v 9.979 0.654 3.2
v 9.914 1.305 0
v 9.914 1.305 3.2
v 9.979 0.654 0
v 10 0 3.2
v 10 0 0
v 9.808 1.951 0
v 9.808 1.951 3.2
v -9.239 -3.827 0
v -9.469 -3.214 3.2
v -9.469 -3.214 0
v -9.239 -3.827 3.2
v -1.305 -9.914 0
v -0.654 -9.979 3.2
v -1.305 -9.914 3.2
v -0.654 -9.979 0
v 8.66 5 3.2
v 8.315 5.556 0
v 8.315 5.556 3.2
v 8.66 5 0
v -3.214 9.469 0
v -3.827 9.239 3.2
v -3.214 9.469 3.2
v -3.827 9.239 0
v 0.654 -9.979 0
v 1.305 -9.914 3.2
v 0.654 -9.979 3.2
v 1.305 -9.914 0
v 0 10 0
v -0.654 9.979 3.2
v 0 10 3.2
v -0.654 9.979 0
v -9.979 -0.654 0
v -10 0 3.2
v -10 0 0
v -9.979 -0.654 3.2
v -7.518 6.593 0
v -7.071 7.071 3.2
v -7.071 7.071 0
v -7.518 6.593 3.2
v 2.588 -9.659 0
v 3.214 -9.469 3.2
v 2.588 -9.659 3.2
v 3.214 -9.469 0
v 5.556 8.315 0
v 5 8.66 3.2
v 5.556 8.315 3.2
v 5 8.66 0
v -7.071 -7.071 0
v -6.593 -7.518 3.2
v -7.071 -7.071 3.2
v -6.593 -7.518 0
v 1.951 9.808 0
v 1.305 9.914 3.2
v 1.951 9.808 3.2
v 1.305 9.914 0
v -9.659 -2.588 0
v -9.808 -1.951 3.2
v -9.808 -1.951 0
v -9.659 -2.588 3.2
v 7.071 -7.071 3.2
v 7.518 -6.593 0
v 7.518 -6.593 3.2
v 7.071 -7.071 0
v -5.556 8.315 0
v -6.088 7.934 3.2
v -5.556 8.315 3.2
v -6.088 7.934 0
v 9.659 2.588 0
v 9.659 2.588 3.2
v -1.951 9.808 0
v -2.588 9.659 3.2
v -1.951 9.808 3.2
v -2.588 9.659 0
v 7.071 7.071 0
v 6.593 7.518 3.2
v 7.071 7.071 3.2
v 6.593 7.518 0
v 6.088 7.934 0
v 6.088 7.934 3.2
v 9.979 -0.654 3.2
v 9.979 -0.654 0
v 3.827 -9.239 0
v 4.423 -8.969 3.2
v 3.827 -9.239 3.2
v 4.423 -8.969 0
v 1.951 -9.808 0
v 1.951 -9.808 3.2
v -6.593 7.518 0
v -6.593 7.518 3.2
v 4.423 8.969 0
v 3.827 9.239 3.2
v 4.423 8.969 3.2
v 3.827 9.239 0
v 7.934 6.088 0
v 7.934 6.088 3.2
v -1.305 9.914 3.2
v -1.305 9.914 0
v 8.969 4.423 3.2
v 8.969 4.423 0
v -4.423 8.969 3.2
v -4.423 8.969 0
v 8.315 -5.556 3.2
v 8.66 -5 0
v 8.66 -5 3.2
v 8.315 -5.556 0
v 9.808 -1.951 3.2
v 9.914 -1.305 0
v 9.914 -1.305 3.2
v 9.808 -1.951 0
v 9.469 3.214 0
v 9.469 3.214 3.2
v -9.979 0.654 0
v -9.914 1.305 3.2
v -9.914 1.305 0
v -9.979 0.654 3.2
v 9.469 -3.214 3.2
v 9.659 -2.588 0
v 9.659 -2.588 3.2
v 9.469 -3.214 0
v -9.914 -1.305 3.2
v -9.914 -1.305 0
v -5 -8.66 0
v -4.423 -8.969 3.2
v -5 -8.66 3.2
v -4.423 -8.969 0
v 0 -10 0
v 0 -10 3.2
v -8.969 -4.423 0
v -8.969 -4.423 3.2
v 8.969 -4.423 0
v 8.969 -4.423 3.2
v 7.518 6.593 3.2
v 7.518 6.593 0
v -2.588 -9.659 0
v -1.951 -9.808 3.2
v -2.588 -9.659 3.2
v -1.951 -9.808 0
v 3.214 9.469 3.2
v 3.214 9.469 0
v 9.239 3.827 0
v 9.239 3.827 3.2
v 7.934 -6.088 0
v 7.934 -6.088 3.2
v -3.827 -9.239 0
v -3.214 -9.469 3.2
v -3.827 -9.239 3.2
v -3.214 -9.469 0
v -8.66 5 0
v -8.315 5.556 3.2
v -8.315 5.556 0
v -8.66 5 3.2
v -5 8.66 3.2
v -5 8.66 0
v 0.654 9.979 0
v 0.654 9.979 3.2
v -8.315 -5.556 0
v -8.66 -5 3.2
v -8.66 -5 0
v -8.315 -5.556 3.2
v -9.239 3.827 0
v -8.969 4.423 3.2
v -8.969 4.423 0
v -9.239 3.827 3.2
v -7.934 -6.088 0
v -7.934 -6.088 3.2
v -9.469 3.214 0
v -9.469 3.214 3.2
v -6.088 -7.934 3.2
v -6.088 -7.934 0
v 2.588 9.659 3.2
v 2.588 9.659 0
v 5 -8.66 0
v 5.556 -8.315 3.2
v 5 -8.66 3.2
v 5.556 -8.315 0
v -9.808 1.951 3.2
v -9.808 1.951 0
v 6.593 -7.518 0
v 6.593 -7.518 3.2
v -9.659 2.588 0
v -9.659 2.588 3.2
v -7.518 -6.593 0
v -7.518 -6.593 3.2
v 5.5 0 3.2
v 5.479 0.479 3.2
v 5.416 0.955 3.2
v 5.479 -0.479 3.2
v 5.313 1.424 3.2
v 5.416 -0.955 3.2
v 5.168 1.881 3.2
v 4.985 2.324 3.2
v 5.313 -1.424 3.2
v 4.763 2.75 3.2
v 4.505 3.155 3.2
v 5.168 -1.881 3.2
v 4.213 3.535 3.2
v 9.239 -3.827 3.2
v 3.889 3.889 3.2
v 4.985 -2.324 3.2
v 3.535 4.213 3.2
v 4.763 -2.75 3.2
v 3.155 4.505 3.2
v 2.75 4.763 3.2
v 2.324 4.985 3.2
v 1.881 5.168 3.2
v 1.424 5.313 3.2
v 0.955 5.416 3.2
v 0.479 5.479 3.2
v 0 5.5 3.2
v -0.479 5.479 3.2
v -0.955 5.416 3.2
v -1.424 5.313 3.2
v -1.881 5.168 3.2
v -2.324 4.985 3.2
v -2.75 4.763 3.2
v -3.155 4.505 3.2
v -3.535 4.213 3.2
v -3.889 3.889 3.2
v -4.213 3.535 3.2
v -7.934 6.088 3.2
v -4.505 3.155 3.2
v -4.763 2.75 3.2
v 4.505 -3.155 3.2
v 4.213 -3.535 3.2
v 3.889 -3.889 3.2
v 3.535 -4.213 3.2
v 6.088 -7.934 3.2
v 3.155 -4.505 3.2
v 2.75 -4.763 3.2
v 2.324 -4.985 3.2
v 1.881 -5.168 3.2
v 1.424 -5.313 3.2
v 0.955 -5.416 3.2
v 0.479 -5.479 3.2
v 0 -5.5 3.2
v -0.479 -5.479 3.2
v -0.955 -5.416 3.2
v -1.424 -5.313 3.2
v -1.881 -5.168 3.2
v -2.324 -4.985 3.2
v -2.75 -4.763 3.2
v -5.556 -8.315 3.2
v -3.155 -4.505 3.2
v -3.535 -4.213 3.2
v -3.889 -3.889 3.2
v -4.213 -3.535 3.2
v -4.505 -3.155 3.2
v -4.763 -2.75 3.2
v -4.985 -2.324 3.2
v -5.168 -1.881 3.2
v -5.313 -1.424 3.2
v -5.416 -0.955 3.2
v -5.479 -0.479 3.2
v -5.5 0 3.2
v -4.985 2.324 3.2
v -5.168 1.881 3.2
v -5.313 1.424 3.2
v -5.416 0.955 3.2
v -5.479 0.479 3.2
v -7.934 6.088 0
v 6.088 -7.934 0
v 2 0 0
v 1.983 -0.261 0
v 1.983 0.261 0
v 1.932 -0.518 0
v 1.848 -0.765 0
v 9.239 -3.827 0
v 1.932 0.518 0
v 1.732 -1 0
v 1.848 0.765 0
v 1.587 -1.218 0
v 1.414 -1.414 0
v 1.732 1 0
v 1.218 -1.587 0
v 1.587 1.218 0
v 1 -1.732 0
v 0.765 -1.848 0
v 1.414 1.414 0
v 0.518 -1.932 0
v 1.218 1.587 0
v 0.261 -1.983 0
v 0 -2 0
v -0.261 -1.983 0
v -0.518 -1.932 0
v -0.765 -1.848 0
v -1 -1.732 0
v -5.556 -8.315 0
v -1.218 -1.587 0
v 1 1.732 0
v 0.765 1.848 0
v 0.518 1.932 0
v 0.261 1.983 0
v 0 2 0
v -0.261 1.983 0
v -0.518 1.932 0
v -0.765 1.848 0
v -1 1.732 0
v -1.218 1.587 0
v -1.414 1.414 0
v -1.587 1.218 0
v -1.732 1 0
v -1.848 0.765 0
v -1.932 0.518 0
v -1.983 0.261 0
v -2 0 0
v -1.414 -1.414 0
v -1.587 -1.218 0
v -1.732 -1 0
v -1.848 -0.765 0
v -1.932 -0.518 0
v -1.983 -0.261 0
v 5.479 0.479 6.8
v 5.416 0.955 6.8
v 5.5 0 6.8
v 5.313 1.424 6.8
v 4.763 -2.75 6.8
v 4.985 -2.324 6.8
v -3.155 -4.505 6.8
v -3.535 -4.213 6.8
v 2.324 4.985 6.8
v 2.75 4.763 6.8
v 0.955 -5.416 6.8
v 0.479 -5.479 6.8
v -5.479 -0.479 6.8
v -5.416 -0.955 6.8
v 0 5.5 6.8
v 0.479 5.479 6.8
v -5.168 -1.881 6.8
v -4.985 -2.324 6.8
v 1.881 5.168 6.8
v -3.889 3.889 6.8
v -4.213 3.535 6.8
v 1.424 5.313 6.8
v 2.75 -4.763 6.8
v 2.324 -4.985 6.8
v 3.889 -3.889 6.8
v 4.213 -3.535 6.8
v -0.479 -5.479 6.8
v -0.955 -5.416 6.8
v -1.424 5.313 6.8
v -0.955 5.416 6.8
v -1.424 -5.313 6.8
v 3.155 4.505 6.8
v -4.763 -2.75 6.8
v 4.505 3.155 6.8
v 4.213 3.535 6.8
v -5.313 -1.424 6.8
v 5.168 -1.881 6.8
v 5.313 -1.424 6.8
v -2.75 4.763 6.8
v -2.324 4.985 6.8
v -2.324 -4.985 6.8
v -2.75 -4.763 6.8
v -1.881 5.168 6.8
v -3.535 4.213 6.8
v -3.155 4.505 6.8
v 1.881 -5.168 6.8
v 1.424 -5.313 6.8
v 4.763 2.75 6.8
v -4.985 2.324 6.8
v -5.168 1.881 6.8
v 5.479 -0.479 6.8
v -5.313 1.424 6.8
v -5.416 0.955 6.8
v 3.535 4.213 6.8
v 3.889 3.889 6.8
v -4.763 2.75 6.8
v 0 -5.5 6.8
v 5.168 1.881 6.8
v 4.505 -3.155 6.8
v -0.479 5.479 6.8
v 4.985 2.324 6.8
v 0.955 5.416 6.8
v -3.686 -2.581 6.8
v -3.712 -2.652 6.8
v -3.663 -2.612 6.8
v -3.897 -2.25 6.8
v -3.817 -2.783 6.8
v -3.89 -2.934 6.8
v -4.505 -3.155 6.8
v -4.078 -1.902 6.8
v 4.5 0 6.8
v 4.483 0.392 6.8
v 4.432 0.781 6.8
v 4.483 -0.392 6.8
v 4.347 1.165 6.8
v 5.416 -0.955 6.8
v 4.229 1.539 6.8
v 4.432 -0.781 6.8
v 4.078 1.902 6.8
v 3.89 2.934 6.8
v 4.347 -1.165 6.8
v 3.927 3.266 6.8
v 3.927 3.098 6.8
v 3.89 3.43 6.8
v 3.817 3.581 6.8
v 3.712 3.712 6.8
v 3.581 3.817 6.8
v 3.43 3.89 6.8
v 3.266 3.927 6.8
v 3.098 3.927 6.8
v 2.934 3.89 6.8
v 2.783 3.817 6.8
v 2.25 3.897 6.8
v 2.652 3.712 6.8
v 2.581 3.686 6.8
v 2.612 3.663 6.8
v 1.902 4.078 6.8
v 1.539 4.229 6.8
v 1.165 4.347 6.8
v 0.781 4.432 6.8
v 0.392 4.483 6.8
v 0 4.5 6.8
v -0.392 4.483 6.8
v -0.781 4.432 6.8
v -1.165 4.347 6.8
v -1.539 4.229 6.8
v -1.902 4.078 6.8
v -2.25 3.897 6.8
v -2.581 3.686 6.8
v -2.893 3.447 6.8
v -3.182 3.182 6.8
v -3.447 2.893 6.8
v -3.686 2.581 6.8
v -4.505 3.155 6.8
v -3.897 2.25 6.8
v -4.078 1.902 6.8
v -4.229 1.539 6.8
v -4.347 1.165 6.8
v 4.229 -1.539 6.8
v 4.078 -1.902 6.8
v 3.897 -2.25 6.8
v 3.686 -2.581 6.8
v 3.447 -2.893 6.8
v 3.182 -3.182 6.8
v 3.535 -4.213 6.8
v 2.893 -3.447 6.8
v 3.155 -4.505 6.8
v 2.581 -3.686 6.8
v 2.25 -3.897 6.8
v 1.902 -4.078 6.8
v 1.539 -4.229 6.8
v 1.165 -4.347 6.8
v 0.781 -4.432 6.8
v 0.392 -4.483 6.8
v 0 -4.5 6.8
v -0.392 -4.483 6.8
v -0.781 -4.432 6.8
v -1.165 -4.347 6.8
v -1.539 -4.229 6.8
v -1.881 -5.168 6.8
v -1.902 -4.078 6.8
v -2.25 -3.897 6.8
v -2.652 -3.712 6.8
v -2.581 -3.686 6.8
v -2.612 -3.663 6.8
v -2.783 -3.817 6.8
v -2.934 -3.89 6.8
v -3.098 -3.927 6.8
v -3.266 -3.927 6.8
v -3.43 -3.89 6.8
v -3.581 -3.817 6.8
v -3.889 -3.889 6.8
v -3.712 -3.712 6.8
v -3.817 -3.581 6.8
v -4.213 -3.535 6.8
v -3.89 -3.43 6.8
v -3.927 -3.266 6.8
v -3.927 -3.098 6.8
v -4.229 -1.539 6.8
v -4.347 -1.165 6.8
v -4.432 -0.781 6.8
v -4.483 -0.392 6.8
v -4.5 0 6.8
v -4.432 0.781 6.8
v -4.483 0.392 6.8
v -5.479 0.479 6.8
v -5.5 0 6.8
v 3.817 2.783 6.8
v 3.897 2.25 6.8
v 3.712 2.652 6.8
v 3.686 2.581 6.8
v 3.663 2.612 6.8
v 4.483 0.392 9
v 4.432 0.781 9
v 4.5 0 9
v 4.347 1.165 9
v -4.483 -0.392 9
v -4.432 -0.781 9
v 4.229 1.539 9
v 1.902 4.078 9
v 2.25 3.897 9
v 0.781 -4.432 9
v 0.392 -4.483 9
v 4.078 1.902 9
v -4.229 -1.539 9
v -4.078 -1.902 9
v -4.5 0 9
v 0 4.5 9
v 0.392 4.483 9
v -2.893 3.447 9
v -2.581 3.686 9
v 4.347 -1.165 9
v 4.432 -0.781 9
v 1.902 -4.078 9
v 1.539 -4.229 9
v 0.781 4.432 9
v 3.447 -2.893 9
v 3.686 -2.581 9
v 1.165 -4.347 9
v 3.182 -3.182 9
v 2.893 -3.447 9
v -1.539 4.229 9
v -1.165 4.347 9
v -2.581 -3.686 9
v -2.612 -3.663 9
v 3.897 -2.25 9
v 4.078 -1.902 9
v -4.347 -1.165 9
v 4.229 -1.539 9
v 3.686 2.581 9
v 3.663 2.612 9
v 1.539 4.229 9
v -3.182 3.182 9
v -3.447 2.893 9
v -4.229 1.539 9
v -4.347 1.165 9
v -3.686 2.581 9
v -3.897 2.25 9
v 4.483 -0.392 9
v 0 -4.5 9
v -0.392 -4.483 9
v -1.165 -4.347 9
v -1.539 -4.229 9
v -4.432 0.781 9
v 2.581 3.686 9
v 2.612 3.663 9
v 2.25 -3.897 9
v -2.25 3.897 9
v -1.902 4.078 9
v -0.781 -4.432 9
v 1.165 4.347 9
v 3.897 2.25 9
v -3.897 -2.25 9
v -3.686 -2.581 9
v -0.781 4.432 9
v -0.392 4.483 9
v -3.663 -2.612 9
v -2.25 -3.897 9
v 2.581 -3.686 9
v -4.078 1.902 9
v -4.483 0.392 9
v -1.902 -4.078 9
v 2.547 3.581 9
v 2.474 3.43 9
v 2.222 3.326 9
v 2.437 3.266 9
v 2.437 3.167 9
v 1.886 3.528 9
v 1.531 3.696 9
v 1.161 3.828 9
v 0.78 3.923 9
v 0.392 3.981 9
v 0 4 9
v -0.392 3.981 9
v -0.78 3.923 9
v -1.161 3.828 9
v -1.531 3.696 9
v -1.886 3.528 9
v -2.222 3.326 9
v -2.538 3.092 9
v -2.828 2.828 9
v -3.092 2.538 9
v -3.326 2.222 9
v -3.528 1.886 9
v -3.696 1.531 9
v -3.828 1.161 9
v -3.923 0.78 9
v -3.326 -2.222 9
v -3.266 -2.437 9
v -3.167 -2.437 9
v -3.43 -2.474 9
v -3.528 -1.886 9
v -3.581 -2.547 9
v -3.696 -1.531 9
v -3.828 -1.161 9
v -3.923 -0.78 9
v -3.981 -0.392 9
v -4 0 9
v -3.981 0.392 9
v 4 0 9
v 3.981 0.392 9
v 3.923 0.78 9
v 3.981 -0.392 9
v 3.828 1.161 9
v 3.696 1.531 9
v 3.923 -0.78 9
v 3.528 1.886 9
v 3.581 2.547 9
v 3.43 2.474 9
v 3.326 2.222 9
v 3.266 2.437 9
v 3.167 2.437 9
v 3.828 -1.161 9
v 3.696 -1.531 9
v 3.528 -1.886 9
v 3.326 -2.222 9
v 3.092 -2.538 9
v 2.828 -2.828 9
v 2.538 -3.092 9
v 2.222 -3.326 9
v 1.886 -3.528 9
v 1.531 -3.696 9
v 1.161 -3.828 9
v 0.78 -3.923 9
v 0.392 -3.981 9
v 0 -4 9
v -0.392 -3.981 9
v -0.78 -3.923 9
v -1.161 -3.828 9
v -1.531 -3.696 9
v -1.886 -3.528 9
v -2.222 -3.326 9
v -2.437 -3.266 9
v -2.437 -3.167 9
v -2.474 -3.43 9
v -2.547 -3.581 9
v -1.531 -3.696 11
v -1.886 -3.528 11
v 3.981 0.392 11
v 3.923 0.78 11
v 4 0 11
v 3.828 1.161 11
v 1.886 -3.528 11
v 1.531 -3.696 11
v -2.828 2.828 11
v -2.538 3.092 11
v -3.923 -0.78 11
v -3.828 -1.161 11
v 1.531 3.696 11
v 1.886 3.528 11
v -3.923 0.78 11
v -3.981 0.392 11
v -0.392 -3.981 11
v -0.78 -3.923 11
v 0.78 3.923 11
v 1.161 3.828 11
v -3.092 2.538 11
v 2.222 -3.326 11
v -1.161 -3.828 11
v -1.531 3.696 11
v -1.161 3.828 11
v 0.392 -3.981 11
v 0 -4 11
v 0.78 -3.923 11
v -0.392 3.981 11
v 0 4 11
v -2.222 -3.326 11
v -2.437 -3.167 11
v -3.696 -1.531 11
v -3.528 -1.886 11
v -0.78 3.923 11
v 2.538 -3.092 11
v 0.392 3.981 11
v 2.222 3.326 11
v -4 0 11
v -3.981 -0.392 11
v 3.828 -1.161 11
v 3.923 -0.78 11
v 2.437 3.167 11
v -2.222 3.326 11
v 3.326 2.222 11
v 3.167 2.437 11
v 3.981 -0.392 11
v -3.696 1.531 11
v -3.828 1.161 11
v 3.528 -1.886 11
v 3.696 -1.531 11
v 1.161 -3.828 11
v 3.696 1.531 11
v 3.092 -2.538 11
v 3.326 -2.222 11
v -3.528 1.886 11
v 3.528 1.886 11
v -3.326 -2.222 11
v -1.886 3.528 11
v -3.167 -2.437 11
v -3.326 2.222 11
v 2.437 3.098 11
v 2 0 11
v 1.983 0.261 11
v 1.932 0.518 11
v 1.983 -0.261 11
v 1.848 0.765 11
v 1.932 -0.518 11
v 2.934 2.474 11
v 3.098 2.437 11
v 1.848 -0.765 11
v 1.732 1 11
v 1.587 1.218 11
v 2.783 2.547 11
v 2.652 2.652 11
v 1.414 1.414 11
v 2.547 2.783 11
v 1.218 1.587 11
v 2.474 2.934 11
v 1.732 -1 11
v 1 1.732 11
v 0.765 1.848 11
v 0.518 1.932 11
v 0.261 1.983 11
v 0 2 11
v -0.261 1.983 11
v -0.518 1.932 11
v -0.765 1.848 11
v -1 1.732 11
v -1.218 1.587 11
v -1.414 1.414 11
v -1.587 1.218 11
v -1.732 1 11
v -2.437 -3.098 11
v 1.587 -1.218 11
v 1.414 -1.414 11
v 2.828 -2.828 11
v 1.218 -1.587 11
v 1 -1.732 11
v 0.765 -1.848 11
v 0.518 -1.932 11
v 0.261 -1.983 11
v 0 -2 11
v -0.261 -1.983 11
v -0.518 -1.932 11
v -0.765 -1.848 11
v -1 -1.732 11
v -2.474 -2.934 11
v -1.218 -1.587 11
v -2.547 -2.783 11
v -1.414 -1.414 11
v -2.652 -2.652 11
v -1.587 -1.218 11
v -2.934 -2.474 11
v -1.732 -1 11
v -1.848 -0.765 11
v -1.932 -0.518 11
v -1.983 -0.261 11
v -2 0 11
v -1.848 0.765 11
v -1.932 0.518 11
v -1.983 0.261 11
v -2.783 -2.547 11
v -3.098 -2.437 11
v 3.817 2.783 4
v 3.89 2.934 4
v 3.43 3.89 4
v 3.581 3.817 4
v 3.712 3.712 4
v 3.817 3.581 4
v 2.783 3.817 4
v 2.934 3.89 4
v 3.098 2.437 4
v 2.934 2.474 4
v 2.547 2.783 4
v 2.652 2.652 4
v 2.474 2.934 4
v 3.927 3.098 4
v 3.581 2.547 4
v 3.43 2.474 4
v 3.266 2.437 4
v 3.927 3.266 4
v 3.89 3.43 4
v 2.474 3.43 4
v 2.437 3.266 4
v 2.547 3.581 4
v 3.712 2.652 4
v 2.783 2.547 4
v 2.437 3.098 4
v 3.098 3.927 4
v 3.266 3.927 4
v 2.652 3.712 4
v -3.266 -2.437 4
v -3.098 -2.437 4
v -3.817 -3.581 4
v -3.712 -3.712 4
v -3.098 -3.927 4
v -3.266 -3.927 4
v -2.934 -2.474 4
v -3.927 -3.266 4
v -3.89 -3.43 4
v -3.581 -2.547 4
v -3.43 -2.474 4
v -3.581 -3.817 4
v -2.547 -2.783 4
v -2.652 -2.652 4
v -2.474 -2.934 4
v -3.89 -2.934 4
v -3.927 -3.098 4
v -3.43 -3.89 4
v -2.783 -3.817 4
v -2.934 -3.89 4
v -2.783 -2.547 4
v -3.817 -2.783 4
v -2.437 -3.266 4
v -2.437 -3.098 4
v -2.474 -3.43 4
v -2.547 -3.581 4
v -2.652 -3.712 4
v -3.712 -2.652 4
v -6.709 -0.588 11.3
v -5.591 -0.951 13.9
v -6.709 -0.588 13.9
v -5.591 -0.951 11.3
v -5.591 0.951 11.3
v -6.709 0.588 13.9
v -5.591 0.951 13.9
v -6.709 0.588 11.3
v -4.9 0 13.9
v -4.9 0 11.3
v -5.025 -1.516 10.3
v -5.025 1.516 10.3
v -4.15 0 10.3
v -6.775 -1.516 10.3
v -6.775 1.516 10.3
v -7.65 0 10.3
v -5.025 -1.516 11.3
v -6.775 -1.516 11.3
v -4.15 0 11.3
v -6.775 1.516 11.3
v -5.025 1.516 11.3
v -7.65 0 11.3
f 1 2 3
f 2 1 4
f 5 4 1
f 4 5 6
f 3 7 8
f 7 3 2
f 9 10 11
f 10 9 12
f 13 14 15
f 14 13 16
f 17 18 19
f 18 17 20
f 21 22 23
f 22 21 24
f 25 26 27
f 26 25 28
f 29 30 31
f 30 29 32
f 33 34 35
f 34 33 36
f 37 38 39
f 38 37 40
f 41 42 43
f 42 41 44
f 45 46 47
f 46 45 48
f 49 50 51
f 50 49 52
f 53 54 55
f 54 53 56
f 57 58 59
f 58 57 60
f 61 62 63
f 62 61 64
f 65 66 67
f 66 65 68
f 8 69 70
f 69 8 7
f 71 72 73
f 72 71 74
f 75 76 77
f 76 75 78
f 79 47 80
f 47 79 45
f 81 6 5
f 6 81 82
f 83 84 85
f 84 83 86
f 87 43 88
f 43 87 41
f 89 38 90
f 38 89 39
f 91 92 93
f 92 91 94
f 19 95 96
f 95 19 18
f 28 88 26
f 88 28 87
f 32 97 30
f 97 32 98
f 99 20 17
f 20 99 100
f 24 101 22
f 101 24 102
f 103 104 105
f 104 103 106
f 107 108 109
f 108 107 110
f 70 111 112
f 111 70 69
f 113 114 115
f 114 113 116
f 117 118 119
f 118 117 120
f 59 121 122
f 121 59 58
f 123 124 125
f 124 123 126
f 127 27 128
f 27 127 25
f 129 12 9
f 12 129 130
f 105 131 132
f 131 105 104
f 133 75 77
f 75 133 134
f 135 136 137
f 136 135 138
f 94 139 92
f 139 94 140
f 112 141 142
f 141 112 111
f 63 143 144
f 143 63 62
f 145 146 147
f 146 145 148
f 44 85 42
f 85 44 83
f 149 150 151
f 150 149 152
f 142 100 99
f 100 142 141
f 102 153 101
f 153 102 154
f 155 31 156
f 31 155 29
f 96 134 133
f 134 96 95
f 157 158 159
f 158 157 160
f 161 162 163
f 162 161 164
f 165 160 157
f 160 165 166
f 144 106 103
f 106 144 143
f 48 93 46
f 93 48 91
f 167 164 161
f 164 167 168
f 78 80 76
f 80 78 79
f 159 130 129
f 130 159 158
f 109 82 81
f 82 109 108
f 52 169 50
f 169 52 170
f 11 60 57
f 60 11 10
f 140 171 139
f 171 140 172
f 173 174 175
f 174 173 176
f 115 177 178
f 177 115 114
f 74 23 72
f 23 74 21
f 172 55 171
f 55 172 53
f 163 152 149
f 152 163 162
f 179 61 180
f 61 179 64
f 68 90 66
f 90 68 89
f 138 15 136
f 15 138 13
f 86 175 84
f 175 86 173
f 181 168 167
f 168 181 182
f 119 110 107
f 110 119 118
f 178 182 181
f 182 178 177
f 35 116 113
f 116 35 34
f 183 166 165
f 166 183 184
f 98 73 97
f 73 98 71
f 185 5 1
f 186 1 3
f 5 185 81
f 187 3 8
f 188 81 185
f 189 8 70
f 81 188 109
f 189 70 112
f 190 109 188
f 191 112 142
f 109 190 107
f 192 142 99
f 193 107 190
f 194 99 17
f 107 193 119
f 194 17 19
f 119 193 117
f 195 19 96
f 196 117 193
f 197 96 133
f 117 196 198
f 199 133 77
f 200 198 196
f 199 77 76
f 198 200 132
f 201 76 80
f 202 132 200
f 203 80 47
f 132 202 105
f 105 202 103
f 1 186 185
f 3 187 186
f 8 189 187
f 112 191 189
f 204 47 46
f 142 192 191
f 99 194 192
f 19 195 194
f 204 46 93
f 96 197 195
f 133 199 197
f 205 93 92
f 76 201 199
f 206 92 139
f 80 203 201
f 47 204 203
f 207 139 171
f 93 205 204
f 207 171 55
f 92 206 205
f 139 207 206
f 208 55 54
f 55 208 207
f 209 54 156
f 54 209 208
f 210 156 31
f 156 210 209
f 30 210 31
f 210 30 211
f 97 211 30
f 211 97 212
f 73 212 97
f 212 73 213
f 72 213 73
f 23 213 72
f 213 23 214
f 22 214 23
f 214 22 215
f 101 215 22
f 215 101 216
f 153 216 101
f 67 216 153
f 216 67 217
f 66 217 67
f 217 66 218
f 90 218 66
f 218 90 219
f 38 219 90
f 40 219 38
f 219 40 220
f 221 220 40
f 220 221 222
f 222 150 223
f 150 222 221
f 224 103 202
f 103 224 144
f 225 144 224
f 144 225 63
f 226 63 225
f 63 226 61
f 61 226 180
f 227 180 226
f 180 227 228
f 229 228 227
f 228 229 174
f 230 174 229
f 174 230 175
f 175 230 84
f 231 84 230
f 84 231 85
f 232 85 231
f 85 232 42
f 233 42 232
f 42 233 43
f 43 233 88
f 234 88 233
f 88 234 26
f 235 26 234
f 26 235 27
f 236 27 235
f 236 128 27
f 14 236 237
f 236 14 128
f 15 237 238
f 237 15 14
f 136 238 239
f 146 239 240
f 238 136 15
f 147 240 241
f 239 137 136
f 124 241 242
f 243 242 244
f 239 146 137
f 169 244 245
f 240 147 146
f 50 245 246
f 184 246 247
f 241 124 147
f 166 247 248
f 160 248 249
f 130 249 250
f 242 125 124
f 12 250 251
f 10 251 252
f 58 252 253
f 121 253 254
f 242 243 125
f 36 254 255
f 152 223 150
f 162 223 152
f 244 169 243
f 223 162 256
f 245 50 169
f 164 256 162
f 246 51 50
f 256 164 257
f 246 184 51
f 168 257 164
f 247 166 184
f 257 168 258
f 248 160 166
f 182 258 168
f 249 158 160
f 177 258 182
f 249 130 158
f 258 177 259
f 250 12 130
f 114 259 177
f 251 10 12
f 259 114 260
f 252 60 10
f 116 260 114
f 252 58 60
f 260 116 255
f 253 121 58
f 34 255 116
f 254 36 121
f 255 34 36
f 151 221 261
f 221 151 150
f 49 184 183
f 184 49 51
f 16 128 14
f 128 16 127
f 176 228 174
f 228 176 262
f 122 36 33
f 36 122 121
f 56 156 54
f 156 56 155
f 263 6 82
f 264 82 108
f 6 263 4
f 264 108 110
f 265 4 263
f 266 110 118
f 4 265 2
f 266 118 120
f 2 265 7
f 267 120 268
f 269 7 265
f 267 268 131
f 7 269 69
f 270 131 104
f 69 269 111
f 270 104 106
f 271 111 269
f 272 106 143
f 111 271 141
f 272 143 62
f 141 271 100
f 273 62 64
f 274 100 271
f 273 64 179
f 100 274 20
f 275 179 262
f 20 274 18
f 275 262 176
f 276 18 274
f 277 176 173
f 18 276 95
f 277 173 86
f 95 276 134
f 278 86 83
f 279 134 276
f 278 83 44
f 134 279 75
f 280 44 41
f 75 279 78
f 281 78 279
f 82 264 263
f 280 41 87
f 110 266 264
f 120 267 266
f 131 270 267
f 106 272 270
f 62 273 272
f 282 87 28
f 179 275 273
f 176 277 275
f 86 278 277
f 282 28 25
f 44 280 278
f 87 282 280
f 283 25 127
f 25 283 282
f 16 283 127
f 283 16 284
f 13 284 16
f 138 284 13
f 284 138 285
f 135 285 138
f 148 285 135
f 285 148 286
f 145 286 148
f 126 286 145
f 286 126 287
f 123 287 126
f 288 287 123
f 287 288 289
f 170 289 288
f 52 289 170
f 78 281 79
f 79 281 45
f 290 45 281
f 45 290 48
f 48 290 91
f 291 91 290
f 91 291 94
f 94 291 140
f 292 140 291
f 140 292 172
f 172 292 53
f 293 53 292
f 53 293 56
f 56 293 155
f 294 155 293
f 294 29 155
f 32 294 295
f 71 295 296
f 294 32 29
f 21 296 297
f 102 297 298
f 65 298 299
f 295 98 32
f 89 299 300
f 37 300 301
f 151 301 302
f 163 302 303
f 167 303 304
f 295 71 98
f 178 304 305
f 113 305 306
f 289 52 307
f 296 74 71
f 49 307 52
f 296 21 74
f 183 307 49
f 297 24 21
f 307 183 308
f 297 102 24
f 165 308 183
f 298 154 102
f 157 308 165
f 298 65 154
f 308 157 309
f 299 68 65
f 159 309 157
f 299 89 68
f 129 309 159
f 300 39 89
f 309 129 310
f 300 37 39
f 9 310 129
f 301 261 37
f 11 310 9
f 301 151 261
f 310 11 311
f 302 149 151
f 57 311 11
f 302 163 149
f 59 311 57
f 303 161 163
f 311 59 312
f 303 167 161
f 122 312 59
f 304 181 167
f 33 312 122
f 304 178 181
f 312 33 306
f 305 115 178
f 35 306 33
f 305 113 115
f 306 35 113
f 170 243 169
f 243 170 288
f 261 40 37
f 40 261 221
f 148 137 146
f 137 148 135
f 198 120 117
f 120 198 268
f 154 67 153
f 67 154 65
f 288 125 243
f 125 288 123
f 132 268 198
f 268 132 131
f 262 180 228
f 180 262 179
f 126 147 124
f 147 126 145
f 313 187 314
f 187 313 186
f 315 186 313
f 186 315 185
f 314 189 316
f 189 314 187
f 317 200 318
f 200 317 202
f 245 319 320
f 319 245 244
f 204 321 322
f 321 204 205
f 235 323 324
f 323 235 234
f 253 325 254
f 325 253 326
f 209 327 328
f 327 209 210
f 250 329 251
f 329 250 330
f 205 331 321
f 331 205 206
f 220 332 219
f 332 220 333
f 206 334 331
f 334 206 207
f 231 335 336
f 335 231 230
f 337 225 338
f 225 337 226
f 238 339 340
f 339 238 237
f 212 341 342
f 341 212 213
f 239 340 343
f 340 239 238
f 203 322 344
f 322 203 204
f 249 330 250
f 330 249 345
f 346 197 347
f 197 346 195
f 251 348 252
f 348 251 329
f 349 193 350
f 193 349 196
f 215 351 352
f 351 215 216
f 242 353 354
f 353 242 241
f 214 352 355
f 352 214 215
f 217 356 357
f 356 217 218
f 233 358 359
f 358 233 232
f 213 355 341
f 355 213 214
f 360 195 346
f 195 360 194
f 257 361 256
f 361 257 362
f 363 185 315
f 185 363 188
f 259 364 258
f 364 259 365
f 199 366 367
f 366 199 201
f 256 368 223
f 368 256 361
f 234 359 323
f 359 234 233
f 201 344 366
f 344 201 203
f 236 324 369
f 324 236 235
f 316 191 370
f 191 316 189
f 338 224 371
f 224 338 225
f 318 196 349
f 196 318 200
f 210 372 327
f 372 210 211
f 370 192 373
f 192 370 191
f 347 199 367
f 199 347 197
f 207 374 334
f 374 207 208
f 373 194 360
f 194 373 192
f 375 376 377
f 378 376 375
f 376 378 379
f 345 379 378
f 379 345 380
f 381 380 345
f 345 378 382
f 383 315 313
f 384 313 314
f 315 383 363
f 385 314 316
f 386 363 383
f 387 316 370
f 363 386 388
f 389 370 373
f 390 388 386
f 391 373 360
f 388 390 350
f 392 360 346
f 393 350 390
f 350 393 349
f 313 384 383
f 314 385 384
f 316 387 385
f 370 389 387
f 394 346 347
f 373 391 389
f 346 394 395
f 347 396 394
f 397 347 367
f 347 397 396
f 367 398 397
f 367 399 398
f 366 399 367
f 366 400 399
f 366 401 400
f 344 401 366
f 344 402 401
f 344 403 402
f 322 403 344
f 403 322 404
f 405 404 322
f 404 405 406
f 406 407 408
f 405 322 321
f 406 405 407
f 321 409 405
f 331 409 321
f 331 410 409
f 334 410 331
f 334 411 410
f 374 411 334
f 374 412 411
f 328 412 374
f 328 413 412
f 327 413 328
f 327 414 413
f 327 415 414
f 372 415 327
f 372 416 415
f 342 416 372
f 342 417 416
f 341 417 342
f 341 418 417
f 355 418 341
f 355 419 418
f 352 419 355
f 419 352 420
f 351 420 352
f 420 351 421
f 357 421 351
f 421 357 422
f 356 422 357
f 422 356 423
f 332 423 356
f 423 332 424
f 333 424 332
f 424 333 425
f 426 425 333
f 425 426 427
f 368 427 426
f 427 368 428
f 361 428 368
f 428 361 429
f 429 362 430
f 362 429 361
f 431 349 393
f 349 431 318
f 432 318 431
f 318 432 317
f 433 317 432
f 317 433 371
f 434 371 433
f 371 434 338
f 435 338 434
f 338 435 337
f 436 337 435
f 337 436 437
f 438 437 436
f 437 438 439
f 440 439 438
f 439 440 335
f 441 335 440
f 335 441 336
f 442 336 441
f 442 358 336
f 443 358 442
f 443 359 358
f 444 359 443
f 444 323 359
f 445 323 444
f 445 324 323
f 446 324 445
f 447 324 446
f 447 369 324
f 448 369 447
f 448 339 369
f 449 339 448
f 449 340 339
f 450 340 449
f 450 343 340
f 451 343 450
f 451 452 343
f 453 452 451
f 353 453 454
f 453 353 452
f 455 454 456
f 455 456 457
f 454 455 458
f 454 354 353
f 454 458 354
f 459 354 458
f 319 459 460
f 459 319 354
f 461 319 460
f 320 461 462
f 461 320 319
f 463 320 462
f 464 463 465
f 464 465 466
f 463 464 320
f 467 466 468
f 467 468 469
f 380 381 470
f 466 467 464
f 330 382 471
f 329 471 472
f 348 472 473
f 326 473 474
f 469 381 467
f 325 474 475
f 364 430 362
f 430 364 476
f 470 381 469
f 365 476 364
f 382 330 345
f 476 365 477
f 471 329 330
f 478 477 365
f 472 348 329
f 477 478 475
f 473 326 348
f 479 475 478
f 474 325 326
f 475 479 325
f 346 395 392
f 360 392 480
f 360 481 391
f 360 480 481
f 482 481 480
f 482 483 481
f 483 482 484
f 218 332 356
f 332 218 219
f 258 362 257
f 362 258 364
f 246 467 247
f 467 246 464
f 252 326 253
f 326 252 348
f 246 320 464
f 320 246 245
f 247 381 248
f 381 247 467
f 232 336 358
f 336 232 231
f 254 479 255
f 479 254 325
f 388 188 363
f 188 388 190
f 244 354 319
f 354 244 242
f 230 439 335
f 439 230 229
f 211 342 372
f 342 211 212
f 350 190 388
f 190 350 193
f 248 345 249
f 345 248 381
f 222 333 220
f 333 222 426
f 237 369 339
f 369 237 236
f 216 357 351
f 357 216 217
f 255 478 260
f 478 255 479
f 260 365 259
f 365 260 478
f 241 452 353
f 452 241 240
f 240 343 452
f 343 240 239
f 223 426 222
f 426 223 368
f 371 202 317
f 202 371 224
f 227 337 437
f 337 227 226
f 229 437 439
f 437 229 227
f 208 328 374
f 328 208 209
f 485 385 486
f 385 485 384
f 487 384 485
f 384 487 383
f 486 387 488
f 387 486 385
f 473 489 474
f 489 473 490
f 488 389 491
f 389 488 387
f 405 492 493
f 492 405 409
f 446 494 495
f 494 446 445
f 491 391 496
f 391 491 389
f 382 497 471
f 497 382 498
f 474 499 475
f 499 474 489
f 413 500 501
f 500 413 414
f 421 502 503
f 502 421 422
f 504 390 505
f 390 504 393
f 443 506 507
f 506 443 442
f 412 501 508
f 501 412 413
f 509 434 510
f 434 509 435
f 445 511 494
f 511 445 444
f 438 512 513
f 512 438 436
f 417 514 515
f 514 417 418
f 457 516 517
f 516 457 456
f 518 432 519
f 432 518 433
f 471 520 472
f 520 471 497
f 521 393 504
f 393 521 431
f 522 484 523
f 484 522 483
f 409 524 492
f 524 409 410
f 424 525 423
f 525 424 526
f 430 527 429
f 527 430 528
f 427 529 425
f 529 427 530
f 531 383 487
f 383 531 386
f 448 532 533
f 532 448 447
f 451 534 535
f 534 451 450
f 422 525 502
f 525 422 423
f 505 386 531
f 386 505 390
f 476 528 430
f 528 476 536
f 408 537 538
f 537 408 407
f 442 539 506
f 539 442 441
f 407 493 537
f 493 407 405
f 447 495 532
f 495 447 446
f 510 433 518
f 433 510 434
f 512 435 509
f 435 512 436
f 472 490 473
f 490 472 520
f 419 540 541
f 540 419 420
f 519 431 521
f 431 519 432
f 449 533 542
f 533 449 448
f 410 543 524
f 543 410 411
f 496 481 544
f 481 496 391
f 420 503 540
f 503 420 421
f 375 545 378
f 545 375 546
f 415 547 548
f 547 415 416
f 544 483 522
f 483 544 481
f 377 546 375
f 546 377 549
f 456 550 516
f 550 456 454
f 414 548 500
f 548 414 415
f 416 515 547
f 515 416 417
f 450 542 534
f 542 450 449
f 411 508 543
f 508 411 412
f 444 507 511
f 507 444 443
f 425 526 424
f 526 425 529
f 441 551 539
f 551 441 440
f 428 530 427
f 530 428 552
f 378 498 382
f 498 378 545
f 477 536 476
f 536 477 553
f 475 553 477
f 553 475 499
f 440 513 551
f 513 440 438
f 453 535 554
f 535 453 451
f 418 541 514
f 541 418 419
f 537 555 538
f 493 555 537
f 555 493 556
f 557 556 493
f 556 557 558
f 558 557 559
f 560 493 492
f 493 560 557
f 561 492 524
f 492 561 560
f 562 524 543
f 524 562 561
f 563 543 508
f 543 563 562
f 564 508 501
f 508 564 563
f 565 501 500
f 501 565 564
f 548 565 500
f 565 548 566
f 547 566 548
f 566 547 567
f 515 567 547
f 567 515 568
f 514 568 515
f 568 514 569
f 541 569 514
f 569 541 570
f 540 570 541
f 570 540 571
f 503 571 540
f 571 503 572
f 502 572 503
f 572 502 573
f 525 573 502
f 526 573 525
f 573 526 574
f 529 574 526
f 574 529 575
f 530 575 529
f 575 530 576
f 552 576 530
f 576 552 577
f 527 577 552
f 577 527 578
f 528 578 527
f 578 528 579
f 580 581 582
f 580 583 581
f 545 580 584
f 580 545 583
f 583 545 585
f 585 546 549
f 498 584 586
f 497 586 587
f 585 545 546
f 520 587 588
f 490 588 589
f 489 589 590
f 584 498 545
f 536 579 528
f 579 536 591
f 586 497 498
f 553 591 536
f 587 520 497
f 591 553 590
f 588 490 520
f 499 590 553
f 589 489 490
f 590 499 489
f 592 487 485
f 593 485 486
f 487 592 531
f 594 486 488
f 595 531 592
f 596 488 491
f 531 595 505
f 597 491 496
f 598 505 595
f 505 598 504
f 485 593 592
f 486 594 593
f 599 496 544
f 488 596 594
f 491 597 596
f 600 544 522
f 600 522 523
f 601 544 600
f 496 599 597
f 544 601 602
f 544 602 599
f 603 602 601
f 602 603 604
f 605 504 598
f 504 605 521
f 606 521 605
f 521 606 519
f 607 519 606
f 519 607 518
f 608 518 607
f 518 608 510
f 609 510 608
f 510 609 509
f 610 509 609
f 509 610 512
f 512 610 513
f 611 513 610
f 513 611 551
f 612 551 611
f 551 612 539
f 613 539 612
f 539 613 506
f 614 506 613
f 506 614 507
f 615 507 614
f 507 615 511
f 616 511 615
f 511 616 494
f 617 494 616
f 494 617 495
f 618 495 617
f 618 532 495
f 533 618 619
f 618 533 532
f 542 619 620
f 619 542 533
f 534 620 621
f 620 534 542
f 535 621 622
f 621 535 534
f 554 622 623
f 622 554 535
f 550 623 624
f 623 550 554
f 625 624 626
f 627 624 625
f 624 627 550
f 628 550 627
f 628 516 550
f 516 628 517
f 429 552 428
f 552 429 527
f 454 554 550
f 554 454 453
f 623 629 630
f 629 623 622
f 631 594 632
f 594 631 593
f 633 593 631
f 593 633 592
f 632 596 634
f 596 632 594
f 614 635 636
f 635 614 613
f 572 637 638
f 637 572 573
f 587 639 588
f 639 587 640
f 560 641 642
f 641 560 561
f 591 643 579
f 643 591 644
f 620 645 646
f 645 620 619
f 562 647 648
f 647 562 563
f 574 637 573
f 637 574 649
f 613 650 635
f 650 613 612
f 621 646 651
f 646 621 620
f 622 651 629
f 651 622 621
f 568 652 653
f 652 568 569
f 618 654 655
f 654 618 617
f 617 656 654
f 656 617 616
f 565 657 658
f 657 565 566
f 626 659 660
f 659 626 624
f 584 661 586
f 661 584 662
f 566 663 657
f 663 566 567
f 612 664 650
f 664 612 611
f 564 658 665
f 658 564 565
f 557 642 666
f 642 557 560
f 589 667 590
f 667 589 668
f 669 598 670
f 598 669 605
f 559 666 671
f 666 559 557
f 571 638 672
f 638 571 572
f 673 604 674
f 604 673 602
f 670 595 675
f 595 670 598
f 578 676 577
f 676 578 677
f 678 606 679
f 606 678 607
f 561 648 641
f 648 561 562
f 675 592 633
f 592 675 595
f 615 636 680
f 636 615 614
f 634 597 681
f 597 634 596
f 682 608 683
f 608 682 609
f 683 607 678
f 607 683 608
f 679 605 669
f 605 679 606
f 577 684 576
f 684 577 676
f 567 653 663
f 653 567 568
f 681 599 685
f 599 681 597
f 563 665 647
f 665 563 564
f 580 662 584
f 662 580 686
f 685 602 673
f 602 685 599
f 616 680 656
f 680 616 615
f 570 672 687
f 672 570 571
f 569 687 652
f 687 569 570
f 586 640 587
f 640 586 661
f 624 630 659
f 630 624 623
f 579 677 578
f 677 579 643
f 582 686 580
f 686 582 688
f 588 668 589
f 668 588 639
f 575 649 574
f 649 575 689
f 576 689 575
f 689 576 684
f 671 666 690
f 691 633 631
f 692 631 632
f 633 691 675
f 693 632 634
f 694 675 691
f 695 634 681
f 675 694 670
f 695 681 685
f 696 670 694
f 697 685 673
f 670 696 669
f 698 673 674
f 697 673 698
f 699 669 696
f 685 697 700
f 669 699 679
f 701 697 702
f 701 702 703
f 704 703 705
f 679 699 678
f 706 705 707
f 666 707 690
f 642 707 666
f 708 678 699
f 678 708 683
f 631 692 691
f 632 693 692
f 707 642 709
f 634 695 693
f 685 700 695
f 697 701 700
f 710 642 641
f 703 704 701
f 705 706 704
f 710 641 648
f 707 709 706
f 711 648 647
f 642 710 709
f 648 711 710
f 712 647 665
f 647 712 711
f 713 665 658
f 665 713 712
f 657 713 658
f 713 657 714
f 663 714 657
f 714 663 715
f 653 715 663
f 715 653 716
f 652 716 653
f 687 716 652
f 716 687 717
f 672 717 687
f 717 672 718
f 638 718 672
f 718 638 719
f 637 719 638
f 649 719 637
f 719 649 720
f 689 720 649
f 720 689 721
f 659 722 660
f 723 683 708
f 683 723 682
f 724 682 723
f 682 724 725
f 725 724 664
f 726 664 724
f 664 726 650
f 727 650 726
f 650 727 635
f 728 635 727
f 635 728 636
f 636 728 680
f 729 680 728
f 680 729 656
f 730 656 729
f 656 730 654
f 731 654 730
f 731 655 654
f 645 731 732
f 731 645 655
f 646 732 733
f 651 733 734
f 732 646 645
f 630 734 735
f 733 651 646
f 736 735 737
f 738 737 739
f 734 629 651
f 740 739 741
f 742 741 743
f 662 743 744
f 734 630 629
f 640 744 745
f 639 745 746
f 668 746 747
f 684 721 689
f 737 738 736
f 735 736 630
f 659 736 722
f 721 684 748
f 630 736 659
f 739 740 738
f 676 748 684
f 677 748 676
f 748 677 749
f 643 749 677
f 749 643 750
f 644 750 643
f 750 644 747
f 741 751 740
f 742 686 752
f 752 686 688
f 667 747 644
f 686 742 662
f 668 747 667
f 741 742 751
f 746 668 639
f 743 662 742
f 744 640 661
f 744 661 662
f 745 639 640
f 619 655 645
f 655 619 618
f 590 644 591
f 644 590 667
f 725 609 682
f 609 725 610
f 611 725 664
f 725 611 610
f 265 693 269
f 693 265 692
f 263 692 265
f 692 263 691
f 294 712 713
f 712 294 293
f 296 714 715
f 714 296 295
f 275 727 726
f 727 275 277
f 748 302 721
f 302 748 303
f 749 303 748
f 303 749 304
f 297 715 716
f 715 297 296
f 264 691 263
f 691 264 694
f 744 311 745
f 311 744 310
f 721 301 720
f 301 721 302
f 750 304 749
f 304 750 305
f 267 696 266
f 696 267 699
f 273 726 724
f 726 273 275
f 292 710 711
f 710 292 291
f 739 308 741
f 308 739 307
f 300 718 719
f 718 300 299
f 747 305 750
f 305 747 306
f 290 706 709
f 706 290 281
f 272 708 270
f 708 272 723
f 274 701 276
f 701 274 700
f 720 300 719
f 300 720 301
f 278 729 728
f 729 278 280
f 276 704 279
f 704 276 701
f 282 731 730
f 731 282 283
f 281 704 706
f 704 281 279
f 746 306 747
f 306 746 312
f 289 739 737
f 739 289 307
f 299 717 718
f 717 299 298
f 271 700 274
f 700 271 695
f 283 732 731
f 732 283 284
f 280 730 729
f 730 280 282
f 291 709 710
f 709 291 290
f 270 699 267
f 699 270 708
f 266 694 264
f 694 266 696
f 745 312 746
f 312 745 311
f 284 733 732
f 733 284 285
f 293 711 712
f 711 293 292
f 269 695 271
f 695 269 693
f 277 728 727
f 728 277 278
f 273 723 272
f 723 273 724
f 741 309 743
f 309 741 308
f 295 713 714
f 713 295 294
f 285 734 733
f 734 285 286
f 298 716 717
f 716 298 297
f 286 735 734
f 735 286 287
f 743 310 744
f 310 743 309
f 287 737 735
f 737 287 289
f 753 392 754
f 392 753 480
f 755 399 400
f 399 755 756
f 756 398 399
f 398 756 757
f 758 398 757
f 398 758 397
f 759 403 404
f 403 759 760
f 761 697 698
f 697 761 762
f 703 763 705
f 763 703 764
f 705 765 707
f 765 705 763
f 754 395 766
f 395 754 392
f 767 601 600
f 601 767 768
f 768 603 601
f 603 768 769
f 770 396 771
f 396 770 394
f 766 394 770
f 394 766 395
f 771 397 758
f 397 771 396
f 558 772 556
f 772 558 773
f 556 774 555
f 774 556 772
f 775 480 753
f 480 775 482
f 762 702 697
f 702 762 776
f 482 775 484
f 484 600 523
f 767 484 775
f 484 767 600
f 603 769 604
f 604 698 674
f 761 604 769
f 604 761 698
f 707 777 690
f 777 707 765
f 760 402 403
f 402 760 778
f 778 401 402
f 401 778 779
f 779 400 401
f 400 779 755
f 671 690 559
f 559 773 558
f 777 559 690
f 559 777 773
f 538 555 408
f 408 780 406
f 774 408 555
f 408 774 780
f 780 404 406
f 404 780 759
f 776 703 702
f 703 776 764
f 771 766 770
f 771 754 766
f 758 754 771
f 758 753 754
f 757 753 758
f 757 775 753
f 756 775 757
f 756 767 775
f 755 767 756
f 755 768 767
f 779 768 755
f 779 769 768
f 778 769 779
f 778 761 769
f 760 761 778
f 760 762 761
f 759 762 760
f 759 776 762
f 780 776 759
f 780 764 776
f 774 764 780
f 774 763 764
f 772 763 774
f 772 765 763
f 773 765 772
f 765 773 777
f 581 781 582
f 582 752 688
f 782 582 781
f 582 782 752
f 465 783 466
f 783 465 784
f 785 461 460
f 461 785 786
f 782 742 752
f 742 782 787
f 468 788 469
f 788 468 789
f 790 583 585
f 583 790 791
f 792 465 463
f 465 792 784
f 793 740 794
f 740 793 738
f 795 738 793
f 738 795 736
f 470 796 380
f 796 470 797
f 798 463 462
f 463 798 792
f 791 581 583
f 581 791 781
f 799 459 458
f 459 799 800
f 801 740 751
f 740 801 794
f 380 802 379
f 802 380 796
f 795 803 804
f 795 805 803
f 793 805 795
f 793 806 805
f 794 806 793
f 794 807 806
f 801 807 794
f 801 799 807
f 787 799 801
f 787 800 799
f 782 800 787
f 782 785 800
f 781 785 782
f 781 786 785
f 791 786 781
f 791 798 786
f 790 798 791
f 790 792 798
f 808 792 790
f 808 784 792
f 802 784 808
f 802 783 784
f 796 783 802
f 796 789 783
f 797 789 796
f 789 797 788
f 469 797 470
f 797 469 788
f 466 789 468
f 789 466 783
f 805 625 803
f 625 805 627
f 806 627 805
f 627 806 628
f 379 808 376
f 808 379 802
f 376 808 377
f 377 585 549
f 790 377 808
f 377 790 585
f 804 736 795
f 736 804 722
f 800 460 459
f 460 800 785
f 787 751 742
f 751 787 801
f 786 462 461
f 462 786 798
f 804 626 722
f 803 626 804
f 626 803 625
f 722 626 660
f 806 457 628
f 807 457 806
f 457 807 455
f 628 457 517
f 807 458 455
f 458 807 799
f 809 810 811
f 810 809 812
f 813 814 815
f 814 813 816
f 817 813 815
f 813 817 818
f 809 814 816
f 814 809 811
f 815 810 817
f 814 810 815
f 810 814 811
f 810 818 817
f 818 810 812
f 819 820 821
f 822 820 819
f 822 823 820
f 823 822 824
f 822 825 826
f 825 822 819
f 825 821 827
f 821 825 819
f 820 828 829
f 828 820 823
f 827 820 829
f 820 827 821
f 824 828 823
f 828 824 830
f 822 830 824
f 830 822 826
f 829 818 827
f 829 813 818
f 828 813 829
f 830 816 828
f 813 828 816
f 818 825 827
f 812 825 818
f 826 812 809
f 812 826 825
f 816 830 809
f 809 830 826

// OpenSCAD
// file: ../parts/b9_pin.scad
// part_id: b9
// name: B9 pin
// source_drawing_ids: DRW-002
// units: mm
// revision: 0.1
// SPDX-License-Identifier: MIT

module part_b9(pin_d = 2.0, pin_h = 8.0, head_d = 3.5, head_h = 1.0) {
    union() {
        cylinder(d = pin_d, h = pin_h, center = false);
        cylinder(d = head_d, h = head_h, center = false);
    }
}
// file: ../parts/b8_rivet_pin.scad
// part_id: b8
// name: B8 rivet pin
// source_drawing_ids: DRW-002
// units: mm
// revision: 0.1
// SPDX-License-Identifier: MIT

module part_b8(pin_d = 1.5, pin_h = 6.2, head_d = 2.4, head_h = 0.9) {
    union() {
        cylinder(d = pin_d, h = pin_h, center = false, $fn = 30);
        cylinder(d = head_d, h = head_h, center = false, $fn = 30);
    }
}

// ---- "main guard" ----
// Default to previewing when opened directly:
if (is_undef(__LIB_MODE__)) {
    part_b8();
}
// file: ../parts/b7_hub.scad
// part_id: b7
// name: B7 hub base
// source_drawing_ids: DRW-002
// units: mm
// revision: 0.1
// SPDX-License-Identifier: MIT

// Axis is +Z. Geometry is a stepped turned hub with rivet holes for b8/b9.
module part_b7(base_d = 20, base_h = 3.2,
               step1_d = 11, step1_h = 3.6,
               step2_d = 9,  step2_h = 2.2,
               step3_d = 8,  step3_h = 2.0,
               top_post_d = 4.0, top_post_h = 1.9,
               bore_d = 4.0,
               rivet_d = 1.5,
               rivet_pitch = 9.0) {
    total_h = base_h + step1_h + step2_h + step3_h + top_post_h;

    difference() {
        union() {
            cylinder(d = base_d, h = base_h, center = false, $fn = 96);
            translate([0, 0, base_h]) cylinder(d = step1_d, h = step1_h, center = false, $fn = 72);
            translate([0, 0, base_h + step1_h]) cylinder(d = step2_d, h = step2_h, center = false, $fn = 72);
            translate([0, 0, base_h + step1_h + step2_h]) cylinder(d = step3_d, h = step3_h, center = false, $fn = 64);
            translate([0, 0, base_h + step1_h + step2_h + step3_h]) cylinder(d = top_post_d, h = top_post_h, center = false, $fn = 48);
        }

        // Main through bore.
        translate([0, 0, -0.1]) cylinder(d = bore_d, h = total_h + 0.3, center = false, $fn = 48);

        // b8/b9 rivet holes near the top shoulder.
        for (a = [45, 225])
            rotate([0, 0, a])
                translate([rivet_pitch / 2, 0, base_h + 0.8])
                    cylinder(d = rivet_d, h = step1_h + step2_h + 1.2, center = false, $fn = 28);
    }
}

// ---- "main guard" ----
// Default to previewing when opened directly:
if (is_undef(__LIB_MODE__)) {
    part_b7();
}
// main file
// DRW-002 reusable B7 subassembly (b7, b8 x2, b9 x1).
// Centered on the b7 axis at origin for reuse in sheet scenes.
// SPDX-License-Identifier: MIT

use <../parts/b7_hub.scad>
use <../parts/b8_rivet_pin.scad>
use <../parts/b9_pin.scad>

module drw002_b7_subassembly(
    b8_offset = 4.0,
    b8_insert_h = 6.0,
    b9_offset = 5.9,
    core_h = 13.9,
    b9_insert_h = 3.6
) {
    color([0.45, 0.30, 0.18])
        part_b7();

    color([0.20, 0.20, 0.20]) {
        for (sx = [-1, 1])
            translate([sx * b8_offset, 0, 0])
                part_b8(pin_h = b8_insert_h);

        translate([-b9_offset, 0, core_h - b9_insert_h])
            part_b9(pin_h = b9_insert_h);
    }
}

// ---- "main guard" ----
if (is_undef(__LIB_MODE__)) {
    drw002_b7_subassembly();
}
